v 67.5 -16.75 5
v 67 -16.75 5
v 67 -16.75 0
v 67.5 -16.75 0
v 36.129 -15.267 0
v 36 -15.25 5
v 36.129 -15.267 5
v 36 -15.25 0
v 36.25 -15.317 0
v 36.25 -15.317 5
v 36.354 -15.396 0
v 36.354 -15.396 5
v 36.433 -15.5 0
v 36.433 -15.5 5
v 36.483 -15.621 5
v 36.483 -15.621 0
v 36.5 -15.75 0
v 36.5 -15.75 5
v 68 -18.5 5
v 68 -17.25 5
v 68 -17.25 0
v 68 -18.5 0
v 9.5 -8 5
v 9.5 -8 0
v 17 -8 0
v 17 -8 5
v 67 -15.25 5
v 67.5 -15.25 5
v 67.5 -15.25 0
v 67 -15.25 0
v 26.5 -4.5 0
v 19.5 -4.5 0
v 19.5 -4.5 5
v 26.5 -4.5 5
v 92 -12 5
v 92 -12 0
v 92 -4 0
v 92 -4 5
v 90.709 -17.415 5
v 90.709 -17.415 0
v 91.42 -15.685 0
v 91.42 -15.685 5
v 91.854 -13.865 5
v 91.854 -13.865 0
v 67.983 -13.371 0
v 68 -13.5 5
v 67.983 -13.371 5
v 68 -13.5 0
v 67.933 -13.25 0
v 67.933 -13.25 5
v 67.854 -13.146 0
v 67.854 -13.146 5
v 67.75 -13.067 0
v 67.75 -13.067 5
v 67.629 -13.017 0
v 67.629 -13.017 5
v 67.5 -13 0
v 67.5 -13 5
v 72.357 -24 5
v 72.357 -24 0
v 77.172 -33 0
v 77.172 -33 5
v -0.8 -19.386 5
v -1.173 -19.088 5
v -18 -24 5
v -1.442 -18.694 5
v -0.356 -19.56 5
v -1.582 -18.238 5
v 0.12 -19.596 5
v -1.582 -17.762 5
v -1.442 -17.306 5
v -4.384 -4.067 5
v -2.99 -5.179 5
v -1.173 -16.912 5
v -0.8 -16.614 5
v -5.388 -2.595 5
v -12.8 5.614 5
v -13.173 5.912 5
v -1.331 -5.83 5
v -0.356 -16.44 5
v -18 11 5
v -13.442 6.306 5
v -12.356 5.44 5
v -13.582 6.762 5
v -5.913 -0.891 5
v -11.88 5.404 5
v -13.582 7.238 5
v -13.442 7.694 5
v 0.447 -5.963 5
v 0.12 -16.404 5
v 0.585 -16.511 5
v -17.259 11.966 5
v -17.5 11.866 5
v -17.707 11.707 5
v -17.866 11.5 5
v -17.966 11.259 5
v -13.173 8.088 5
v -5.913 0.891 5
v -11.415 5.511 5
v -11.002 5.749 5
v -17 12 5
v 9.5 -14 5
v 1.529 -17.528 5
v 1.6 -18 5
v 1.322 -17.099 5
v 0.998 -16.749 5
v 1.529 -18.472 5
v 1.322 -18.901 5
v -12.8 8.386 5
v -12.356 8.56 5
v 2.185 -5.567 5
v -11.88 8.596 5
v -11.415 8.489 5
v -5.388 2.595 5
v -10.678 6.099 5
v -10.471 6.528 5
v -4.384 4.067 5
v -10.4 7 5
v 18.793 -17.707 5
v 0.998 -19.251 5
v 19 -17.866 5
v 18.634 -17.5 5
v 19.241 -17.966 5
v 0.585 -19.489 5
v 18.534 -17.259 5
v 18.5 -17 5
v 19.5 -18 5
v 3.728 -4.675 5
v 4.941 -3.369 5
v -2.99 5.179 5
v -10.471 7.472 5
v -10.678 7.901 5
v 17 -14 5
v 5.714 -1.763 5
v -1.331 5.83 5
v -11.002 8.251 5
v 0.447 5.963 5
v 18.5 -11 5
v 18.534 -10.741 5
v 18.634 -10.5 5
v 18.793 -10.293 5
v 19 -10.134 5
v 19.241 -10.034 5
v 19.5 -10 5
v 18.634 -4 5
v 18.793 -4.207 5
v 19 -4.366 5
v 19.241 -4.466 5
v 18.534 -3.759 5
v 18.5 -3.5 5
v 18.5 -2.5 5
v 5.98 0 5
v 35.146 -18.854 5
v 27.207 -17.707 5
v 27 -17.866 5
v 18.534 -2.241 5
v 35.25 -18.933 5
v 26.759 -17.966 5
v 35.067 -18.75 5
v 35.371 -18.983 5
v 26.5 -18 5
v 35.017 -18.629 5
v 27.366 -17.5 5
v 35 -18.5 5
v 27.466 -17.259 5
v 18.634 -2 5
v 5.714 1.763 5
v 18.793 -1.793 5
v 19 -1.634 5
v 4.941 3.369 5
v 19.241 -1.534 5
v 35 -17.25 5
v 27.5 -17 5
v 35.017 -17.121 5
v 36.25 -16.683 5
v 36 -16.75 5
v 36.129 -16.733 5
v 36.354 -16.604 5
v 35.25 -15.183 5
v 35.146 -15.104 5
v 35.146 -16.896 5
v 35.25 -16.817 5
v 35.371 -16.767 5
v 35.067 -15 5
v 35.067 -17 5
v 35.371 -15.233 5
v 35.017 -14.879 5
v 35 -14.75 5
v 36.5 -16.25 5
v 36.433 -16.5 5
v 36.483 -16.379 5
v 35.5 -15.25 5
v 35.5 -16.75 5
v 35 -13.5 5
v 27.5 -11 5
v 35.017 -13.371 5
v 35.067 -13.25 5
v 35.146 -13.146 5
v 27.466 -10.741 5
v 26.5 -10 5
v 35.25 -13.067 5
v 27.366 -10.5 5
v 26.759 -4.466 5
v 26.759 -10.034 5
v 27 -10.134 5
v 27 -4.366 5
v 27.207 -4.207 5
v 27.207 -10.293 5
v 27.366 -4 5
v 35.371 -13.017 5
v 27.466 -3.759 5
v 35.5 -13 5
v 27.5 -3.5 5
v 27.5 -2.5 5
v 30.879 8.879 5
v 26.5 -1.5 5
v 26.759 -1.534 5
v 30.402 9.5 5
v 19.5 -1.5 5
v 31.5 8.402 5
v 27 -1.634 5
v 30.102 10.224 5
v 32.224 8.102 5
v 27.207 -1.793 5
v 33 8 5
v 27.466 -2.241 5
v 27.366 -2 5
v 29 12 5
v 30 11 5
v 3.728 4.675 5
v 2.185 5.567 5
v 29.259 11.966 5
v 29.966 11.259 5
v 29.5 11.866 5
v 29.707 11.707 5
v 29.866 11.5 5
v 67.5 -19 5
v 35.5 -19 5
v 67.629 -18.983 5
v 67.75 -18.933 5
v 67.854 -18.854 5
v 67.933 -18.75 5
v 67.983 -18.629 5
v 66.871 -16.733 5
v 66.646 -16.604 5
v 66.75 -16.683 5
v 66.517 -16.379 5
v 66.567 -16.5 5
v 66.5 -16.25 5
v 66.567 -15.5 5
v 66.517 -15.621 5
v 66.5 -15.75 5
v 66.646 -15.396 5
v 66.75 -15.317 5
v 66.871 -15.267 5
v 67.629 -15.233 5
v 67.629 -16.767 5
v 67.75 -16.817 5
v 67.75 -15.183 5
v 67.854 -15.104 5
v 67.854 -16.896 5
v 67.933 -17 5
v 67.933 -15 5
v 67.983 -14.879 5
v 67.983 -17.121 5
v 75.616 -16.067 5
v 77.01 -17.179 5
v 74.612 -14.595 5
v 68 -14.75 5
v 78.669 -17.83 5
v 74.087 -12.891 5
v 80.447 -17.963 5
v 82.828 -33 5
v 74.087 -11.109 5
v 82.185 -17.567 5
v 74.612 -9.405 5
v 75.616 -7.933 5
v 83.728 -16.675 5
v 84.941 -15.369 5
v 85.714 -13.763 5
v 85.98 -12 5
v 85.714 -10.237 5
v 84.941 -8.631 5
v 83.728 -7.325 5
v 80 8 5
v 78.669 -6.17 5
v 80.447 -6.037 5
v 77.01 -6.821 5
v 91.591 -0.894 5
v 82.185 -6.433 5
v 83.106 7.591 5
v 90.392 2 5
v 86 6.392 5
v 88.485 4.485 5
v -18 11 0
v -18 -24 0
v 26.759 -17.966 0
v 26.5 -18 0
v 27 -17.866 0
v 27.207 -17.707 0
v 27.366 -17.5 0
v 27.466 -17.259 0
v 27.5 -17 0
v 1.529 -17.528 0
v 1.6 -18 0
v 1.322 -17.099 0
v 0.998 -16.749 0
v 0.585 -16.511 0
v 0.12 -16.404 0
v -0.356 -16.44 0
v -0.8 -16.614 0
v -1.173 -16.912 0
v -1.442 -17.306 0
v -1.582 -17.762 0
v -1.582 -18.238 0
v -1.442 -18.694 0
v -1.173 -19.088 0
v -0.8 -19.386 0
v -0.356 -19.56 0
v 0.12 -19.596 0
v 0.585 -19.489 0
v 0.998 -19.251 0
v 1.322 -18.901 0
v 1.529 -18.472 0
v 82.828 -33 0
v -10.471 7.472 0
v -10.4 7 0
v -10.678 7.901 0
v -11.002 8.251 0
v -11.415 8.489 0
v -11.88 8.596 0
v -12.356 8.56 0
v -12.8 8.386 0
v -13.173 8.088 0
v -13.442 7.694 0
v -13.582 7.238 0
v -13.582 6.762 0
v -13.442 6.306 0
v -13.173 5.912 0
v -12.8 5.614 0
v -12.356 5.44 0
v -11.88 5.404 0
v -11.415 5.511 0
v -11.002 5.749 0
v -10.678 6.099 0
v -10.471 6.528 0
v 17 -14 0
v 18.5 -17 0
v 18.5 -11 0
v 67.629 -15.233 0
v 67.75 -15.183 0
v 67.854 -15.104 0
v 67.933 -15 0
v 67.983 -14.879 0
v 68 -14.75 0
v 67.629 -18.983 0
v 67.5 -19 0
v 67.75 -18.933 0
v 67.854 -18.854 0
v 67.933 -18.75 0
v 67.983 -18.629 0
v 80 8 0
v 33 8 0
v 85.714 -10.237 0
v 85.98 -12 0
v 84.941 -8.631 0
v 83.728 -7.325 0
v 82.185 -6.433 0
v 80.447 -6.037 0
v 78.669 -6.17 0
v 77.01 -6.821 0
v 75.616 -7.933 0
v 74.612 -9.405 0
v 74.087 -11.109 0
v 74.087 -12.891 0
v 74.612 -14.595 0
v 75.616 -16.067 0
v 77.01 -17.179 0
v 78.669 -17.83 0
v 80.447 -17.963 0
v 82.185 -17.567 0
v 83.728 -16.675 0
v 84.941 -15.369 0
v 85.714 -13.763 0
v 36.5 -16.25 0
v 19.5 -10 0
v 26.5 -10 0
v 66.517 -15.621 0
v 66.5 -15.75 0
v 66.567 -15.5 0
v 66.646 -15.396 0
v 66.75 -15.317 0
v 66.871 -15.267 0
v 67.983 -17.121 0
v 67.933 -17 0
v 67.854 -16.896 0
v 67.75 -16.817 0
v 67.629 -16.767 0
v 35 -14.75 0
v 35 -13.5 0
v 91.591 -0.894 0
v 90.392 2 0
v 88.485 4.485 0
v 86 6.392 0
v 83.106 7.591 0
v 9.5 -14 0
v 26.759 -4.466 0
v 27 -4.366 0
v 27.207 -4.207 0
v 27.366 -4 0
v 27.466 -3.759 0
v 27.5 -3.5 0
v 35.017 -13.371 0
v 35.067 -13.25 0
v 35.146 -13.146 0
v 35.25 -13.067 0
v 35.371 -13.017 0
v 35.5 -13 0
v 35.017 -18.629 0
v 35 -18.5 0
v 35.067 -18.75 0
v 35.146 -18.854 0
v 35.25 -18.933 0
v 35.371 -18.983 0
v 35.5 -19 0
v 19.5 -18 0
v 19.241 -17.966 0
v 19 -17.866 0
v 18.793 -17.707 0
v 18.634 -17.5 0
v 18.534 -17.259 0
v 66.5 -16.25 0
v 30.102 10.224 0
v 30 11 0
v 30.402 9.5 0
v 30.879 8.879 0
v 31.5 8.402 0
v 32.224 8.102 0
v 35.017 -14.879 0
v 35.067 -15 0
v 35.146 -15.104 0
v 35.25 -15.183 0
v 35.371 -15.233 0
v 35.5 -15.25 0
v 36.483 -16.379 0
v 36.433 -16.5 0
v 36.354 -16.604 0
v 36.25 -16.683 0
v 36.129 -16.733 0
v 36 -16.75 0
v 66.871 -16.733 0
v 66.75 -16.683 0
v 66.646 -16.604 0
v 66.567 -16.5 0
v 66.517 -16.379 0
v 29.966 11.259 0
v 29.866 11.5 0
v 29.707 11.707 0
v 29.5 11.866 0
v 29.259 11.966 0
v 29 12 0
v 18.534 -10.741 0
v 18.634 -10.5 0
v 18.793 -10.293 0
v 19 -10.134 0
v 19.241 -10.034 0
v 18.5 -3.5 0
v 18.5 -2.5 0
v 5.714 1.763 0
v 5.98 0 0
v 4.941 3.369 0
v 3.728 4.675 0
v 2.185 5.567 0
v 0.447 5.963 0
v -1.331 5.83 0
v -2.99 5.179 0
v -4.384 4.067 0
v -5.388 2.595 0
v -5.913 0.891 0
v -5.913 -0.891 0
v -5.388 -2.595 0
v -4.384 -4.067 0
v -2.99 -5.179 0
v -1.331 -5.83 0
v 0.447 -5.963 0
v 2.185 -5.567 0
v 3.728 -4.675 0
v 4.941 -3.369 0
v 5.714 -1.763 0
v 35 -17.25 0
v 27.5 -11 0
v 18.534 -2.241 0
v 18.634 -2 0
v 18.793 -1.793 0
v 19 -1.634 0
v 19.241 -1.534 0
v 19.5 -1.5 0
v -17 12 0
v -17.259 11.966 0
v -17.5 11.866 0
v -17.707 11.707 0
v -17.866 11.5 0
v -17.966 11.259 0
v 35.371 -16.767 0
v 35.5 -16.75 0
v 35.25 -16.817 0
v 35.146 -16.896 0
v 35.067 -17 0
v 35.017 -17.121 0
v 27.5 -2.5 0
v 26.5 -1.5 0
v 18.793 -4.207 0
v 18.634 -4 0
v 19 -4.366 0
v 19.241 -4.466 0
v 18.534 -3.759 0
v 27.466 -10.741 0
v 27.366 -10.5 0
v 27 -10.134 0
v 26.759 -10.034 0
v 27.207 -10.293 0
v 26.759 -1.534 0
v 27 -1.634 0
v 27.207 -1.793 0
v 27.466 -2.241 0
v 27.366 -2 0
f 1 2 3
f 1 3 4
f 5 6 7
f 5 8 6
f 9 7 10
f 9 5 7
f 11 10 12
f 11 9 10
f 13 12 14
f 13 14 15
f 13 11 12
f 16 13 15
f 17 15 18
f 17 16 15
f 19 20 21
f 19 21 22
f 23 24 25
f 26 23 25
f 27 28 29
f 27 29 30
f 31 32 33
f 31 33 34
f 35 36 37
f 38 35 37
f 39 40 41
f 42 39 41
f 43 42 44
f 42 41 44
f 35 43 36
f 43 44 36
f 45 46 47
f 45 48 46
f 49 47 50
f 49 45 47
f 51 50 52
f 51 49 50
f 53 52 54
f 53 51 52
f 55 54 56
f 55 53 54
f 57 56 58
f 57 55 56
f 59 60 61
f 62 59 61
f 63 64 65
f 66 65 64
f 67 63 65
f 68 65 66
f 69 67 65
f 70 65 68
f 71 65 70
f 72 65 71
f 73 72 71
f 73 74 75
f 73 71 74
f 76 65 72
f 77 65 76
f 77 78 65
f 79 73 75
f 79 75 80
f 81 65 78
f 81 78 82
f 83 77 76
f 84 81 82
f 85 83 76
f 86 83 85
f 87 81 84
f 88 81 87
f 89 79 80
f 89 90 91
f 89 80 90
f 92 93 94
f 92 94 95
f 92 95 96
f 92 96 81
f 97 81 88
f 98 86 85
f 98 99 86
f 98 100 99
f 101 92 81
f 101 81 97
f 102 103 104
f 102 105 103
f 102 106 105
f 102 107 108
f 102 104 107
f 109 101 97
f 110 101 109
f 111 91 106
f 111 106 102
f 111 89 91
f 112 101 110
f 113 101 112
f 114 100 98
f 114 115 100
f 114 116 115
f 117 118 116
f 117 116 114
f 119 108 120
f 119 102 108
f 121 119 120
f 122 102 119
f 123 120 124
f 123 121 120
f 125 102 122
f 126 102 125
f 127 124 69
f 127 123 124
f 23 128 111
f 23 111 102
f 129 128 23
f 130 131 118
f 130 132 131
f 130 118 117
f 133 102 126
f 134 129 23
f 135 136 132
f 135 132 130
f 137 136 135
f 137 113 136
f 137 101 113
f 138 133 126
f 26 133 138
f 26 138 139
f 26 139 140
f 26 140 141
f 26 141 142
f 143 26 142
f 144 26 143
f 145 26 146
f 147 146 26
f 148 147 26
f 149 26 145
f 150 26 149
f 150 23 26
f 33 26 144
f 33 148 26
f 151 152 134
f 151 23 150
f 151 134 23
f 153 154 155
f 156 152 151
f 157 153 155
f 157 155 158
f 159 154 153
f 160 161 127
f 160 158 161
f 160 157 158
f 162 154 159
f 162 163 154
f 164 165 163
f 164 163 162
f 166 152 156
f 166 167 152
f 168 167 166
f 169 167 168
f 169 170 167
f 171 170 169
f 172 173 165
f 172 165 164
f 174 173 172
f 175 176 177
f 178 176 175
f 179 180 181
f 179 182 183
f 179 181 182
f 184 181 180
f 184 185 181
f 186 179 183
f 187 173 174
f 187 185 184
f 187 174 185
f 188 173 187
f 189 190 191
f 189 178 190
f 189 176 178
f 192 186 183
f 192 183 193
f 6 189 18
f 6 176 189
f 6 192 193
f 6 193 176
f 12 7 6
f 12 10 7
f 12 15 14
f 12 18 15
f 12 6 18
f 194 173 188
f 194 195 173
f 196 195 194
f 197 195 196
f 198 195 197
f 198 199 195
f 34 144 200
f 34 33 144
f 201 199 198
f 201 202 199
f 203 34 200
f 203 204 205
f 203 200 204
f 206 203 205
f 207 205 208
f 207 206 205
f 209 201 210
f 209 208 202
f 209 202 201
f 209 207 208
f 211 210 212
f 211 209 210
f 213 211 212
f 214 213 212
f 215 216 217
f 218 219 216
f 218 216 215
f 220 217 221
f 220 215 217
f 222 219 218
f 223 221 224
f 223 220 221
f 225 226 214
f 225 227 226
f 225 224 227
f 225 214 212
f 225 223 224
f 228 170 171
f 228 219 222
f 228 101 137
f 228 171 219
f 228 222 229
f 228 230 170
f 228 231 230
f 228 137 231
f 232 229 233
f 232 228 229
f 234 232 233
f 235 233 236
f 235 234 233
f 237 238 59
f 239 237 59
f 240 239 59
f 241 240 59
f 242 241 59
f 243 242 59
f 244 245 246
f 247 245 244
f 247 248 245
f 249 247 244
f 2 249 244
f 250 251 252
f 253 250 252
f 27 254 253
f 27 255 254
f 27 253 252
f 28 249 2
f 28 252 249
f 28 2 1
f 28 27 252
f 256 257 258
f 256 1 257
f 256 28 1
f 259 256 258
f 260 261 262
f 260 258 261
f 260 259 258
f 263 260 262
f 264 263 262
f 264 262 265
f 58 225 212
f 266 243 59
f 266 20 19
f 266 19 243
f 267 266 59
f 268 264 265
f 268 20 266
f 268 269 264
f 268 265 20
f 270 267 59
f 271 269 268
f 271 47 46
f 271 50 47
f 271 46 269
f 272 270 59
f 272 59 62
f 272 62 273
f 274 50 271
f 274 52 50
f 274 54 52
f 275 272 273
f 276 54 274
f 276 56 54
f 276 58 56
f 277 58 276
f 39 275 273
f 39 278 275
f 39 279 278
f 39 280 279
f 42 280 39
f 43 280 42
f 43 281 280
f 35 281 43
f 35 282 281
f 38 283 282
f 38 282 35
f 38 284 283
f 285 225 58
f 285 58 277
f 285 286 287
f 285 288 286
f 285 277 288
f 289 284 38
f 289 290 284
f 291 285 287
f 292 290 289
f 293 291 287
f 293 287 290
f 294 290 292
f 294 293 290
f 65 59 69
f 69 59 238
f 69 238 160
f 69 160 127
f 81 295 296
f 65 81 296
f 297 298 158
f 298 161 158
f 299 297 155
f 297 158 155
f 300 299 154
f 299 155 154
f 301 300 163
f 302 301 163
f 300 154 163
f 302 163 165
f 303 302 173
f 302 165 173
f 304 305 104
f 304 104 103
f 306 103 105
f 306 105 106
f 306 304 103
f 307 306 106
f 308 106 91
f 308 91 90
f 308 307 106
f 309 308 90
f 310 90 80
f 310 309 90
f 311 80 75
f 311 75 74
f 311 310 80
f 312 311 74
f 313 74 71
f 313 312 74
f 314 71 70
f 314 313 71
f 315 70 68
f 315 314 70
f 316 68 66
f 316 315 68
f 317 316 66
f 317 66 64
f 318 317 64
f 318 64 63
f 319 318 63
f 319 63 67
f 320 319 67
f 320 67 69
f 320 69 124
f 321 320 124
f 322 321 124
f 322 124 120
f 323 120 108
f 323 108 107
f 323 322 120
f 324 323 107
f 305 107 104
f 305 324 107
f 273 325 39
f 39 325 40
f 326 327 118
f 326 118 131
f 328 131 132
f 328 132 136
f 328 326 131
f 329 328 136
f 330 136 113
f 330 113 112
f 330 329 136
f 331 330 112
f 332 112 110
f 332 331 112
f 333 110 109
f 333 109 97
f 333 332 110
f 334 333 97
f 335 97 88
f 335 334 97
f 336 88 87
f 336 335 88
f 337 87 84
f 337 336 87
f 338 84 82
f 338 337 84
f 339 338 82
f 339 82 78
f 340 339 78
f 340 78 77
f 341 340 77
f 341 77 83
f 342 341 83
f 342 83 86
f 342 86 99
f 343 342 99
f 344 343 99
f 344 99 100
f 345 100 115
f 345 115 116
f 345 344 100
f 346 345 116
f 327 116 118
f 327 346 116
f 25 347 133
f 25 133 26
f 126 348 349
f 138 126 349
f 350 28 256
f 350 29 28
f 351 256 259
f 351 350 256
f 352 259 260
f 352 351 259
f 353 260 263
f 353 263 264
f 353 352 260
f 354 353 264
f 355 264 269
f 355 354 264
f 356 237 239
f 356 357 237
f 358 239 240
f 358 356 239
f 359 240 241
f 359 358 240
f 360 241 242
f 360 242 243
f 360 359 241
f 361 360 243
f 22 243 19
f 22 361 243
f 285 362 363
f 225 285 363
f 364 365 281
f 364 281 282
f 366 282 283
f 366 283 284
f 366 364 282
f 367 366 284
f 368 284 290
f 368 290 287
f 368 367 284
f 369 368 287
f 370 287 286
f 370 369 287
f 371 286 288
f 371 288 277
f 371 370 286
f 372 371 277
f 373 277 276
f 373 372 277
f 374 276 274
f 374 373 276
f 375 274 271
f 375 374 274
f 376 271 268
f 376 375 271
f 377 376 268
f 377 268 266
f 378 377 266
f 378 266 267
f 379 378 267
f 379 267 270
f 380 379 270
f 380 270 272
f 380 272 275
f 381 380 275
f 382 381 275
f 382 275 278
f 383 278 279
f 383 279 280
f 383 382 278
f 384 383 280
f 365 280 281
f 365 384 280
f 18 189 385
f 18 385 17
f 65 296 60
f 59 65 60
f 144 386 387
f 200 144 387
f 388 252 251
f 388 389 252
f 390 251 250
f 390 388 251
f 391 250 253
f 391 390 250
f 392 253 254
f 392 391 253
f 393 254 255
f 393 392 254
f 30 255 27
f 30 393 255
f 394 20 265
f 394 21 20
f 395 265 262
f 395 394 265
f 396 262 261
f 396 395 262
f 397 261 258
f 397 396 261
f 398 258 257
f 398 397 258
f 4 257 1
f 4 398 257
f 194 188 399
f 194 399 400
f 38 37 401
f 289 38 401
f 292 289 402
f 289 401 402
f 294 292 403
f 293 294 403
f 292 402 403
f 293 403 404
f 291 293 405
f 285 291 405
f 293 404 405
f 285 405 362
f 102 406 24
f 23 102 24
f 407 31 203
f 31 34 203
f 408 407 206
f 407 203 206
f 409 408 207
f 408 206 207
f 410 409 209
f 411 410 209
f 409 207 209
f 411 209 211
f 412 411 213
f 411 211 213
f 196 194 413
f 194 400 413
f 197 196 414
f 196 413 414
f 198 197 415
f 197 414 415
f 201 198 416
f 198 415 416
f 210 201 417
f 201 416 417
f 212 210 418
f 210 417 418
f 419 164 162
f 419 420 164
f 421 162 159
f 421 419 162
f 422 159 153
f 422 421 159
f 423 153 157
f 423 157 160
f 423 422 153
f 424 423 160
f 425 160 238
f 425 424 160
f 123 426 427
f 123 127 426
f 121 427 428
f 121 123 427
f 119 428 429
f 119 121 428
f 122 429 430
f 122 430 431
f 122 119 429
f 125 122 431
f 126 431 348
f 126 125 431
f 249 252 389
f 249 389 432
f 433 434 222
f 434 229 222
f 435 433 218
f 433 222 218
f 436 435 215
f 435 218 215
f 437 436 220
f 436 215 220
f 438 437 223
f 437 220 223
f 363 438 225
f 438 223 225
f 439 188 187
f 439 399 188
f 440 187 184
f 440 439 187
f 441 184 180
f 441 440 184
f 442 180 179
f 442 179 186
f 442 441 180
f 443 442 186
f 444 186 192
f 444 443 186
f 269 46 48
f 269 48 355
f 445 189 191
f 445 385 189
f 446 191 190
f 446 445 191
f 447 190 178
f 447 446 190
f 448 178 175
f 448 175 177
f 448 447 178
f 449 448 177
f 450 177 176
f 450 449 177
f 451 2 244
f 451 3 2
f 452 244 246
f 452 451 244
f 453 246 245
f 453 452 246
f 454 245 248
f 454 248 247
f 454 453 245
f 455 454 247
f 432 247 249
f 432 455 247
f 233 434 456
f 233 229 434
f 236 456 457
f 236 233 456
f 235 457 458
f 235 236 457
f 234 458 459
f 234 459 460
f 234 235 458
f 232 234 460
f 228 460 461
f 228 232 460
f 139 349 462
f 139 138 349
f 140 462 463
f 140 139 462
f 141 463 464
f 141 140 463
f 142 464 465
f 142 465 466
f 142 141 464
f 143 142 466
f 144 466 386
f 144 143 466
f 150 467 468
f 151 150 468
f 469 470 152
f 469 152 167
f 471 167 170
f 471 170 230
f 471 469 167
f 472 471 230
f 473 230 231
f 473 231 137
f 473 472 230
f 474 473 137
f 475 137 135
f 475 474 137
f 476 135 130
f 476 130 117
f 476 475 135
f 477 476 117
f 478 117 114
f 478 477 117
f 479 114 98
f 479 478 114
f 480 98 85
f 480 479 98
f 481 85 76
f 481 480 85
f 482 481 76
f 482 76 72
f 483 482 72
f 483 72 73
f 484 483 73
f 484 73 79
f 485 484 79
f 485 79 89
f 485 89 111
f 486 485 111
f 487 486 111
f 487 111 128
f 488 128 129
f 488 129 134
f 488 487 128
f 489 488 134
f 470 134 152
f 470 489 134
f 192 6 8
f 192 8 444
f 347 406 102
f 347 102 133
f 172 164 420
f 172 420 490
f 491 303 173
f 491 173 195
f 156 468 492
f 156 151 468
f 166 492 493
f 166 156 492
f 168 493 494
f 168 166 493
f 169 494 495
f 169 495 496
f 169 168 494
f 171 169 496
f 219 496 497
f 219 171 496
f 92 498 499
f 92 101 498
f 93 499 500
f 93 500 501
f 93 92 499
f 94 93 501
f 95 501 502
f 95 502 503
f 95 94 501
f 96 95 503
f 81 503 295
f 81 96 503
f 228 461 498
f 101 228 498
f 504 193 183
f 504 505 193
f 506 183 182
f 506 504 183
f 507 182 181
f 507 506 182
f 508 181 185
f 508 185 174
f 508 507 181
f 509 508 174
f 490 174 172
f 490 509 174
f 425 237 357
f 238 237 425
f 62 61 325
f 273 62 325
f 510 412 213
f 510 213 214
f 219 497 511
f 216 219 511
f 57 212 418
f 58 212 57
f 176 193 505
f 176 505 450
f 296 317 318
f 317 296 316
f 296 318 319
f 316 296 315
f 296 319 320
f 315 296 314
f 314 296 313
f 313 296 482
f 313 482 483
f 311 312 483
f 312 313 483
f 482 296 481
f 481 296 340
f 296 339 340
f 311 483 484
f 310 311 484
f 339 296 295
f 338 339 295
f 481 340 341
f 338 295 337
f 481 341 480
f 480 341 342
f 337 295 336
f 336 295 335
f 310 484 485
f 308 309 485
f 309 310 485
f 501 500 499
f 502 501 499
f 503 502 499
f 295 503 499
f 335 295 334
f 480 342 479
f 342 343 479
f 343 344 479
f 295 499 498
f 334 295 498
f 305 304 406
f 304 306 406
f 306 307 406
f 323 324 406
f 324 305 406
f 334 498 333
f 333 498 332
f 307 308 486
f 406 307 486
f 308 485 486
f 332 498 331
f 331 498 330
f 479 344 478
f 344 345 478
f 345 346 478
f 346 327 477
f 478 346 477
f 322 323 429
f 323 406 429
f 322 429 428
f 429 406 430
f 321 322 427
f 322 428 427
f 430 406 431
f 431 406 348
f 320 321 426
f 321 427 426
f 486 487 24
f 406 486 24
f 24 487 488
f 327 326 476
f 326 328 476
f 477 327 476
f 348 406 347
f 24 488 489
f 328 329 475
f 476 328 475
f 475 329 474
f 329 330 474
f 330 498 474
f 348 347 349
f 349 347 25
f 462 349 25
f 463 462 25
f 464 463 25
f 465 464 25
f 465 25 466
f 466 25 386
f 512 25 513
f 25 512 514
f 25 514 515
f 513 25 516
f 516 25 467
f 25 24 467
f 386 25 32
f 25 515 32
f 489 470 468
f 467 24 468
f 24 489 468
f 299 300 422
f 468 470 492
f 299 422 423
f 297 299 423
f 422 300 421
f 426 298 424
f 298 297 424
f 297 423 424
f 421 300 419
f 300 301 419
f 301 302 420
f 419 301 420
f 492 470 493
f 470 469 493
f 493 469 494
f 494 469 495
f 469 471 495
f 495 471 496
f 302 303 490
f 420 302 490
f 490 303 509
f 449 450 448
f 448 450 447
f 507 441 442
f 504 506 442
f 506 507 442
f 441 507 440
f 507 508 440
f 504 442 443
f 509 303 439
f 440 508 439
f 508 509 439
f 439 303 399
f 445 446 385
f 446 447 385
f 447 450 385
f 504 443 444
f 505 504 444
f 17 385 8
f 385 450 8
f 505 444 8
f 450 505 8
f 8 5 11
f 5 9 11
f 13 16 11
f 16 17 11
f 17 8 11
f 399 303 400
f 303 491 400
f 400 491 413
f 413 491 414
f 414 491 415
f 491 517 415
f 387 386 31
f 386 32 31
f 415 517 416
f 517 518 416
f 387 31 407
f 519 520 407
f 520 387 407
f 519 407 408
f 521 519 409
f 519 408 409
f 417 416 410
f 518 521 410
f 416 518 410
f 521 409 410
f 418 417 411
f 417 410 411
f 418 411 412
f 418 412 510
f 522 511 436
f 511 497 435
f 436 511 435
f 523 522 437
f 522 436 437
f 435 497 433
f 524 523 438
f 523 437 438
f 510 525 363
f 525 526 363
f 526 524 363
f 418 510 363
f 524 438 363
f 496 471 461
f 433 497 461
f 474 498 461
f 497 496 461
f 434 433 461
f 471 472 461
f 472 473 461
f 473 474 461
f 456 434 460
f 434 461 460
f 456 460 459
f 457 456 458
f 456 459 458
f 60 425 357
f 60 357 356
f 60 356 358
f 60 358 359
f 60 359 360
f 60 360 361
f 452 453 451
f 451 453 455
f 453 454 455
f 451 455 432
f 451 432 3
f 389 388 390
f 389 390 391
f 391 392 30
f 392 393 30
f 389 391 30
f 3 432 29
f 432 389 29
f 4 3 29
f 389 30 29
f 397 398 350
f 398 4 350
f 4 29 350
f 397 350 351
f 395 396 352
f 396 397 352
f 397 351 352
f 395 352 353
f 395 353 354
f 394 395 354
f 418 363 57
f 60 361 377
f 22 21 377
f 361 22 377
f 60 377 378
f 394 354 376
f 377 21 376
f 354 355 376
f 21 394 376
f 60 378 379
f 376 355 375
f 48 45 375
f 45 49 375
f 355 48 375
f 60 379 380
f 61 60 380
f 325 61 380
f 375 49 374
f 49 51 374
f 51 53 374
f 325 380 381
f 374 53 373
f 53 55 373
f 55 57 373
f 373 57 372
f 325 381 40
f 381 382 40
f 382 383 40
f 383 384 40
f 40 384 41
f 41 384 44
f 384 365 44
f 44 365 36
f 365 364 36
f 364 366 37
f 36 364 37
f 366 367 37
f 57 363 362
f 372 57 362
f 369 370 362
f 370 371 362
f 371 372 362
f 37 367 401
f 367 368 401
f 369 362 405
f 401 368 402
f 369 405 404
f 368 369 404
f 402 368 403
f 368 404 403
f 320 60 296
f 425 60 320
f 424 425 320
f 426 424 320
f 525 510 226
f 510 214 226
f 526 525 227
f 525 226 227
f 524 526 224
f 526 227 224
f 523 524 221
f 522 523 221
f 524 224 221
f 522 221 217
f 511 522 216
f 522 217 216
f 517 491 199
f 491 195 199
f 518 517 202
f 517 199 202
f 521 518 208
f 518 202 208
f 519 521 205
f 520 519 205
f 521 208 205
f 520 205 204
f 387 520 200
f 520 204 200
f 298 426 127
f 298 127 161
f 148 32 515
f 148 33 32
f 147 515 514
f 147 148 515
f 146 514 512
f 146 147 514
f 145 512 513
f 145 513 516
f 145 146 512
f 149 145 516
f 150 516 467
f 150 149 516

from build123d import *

# Parameters (mm, degrees)
SKETCH1_R           = 5.98
SKETCH1_R_2         = 1.6
SKETCH1_W           = 9
SKETCH1_H           = 8
SKETCH1_H_2         = 3
SKETCH1_W_2         = 7.5
SKETCH1_H_3         = 6
BOSS_EXTRUDE1_DEPTH = 5
FILLET1_R           = 1
FILLET2_R           = 3
FILLET3_R           = 1
CUT_EXTRUDE1_DEPTH  = 98.867257037
FILLET4_R           = 0.5


with BuildPart() as part:
    # Sketch1 → Boss-Extrude1 (new body)
    with BuildSketch(Plane.XY):
        with BuildLine():
            Line((72.356568311, -24), (77.172081726, -33))
            Line((77.172081726, -33), (82.827918274, -33))
            Line((82.827918274, -33), (90.70873293, -17.415075165))
            ThreePointArc((90.70873293, -17.415075165), (91.67272023, -14.78345153), (92, -12))
            Line((92, -12), (92, -4))
            ThreePointArc((92, -4), (88.485281374, 4.485281374), (80, 8))
            Line((80, 8), (30, 8))
            Line((30, 8), (30, 12))
            Line((30, 12), (-18, 12))
            Line((-18, 12), (-18, -24))
            Line((-18, -24), (72.356568311, -24))
        make_face()
        Circle(SKETCH1_R, mode=Mode.SUBTRACT)
        with Locations((80, -12)):
            Circle(SKETCH1_R, mode=Mode.SUBTRACT)
        with Locations((-12, 7)):
            Circle(SKETCH1_R_2, mode=Mode.SUBTRACT)
        with Locations((0, -18)):
            Circle(SKETCH1_R_2, mode=Mode.SUBTRACT)
        with Locations((23, -14)):
            Rectangle(SKETCH1_W, SKETCH1_H, mode=Mode.SUBTRACT)
        with Locations((23, -3)):
            Rectangle(SKETCH1_W, SKETCH1_H_2, mode=Mode.SUBTRACT)
        with Locations((13.25, -11)):
            Rectangle(SKETCH1_W_2, SKETCH1_H_3, mode=Mode.SUBTRACT)
    extrude(amount=BOSS_EXTRUDE1_DEPTH)

    # Fillet1
    fillet1_edges = [part.edges().sort_by_distance(p)[0] for p in [
        (18.5, -10, 2.5),
        (18.5, -18, 2.5),
        (27.5, -18, 2.5),
        (27.5, -10, 2.5),
        (18.5, -1.5, 2.5),
        (18.5, -4.5, 2.5),
        (27.5, -4.5, 2.5),
        (27.5, -1.5, 2.5),
    ]]
    fillet(fillet1_edges, radius=FILLET1_R)

    # Fillet2
    fillet2_edges = [part.edges().sort_by_distance(p)[0] for p in [
        (30, 8, 2.5),
    ]]
    fillet(fillet2_edges, radius=FILLET2_R)

    # Fillet3
    fillet3_edges = [part.edges().sort_by_distance(p)[0] for p in [
        (30, 12, 2.5),
        (-18, 12, 2.5),
    ]]
    fillet(fillet3_edges, radius=FILLET3_R - 0.0001)  # a hair under: the kernel refuses the full size

    # Sketch2 → Cut-Extrude1 (cut, through all)
    with BuildSketch(Plane.XY.offset(5)):
        Polygon((35, -13), (68, -13), (68, -15.25), (66.5, -15.25), (66.5, -16.75), (68, -16.75), (68, -19), (35, -19), (35, -16.75), (36.5, -16.75), (36.5, -15.25), (35, -15.25), align=None)
    extrude(amount=-CUT_EXTRUDE1_DEPTH, mode=Mode.SUBTRACT)

    # Fillet4
    fillet4_edges = [part.edges().sort_by_distance(p)[0] for p in [
        (35, -15.25, 2.5),
        (35, -13, 2.5),
        (68, -13, 2.5),
        (68, -15.25, 2.5),
        (66.5, -15.25, 2.5),
        (66.5, -16.75, 2.5),
        (68, -16.75, 2.5),
        (68, -19, 2.5),
        (35, -19, 2.5),
        (35, -16.75, 2.5),
        (36.5, -16.75, 2.5),
        (36.5, -15.25, 2.5),
    ]]
    fillet(fillet4_edges, radius=FILLET4_R)


solid = part.part
